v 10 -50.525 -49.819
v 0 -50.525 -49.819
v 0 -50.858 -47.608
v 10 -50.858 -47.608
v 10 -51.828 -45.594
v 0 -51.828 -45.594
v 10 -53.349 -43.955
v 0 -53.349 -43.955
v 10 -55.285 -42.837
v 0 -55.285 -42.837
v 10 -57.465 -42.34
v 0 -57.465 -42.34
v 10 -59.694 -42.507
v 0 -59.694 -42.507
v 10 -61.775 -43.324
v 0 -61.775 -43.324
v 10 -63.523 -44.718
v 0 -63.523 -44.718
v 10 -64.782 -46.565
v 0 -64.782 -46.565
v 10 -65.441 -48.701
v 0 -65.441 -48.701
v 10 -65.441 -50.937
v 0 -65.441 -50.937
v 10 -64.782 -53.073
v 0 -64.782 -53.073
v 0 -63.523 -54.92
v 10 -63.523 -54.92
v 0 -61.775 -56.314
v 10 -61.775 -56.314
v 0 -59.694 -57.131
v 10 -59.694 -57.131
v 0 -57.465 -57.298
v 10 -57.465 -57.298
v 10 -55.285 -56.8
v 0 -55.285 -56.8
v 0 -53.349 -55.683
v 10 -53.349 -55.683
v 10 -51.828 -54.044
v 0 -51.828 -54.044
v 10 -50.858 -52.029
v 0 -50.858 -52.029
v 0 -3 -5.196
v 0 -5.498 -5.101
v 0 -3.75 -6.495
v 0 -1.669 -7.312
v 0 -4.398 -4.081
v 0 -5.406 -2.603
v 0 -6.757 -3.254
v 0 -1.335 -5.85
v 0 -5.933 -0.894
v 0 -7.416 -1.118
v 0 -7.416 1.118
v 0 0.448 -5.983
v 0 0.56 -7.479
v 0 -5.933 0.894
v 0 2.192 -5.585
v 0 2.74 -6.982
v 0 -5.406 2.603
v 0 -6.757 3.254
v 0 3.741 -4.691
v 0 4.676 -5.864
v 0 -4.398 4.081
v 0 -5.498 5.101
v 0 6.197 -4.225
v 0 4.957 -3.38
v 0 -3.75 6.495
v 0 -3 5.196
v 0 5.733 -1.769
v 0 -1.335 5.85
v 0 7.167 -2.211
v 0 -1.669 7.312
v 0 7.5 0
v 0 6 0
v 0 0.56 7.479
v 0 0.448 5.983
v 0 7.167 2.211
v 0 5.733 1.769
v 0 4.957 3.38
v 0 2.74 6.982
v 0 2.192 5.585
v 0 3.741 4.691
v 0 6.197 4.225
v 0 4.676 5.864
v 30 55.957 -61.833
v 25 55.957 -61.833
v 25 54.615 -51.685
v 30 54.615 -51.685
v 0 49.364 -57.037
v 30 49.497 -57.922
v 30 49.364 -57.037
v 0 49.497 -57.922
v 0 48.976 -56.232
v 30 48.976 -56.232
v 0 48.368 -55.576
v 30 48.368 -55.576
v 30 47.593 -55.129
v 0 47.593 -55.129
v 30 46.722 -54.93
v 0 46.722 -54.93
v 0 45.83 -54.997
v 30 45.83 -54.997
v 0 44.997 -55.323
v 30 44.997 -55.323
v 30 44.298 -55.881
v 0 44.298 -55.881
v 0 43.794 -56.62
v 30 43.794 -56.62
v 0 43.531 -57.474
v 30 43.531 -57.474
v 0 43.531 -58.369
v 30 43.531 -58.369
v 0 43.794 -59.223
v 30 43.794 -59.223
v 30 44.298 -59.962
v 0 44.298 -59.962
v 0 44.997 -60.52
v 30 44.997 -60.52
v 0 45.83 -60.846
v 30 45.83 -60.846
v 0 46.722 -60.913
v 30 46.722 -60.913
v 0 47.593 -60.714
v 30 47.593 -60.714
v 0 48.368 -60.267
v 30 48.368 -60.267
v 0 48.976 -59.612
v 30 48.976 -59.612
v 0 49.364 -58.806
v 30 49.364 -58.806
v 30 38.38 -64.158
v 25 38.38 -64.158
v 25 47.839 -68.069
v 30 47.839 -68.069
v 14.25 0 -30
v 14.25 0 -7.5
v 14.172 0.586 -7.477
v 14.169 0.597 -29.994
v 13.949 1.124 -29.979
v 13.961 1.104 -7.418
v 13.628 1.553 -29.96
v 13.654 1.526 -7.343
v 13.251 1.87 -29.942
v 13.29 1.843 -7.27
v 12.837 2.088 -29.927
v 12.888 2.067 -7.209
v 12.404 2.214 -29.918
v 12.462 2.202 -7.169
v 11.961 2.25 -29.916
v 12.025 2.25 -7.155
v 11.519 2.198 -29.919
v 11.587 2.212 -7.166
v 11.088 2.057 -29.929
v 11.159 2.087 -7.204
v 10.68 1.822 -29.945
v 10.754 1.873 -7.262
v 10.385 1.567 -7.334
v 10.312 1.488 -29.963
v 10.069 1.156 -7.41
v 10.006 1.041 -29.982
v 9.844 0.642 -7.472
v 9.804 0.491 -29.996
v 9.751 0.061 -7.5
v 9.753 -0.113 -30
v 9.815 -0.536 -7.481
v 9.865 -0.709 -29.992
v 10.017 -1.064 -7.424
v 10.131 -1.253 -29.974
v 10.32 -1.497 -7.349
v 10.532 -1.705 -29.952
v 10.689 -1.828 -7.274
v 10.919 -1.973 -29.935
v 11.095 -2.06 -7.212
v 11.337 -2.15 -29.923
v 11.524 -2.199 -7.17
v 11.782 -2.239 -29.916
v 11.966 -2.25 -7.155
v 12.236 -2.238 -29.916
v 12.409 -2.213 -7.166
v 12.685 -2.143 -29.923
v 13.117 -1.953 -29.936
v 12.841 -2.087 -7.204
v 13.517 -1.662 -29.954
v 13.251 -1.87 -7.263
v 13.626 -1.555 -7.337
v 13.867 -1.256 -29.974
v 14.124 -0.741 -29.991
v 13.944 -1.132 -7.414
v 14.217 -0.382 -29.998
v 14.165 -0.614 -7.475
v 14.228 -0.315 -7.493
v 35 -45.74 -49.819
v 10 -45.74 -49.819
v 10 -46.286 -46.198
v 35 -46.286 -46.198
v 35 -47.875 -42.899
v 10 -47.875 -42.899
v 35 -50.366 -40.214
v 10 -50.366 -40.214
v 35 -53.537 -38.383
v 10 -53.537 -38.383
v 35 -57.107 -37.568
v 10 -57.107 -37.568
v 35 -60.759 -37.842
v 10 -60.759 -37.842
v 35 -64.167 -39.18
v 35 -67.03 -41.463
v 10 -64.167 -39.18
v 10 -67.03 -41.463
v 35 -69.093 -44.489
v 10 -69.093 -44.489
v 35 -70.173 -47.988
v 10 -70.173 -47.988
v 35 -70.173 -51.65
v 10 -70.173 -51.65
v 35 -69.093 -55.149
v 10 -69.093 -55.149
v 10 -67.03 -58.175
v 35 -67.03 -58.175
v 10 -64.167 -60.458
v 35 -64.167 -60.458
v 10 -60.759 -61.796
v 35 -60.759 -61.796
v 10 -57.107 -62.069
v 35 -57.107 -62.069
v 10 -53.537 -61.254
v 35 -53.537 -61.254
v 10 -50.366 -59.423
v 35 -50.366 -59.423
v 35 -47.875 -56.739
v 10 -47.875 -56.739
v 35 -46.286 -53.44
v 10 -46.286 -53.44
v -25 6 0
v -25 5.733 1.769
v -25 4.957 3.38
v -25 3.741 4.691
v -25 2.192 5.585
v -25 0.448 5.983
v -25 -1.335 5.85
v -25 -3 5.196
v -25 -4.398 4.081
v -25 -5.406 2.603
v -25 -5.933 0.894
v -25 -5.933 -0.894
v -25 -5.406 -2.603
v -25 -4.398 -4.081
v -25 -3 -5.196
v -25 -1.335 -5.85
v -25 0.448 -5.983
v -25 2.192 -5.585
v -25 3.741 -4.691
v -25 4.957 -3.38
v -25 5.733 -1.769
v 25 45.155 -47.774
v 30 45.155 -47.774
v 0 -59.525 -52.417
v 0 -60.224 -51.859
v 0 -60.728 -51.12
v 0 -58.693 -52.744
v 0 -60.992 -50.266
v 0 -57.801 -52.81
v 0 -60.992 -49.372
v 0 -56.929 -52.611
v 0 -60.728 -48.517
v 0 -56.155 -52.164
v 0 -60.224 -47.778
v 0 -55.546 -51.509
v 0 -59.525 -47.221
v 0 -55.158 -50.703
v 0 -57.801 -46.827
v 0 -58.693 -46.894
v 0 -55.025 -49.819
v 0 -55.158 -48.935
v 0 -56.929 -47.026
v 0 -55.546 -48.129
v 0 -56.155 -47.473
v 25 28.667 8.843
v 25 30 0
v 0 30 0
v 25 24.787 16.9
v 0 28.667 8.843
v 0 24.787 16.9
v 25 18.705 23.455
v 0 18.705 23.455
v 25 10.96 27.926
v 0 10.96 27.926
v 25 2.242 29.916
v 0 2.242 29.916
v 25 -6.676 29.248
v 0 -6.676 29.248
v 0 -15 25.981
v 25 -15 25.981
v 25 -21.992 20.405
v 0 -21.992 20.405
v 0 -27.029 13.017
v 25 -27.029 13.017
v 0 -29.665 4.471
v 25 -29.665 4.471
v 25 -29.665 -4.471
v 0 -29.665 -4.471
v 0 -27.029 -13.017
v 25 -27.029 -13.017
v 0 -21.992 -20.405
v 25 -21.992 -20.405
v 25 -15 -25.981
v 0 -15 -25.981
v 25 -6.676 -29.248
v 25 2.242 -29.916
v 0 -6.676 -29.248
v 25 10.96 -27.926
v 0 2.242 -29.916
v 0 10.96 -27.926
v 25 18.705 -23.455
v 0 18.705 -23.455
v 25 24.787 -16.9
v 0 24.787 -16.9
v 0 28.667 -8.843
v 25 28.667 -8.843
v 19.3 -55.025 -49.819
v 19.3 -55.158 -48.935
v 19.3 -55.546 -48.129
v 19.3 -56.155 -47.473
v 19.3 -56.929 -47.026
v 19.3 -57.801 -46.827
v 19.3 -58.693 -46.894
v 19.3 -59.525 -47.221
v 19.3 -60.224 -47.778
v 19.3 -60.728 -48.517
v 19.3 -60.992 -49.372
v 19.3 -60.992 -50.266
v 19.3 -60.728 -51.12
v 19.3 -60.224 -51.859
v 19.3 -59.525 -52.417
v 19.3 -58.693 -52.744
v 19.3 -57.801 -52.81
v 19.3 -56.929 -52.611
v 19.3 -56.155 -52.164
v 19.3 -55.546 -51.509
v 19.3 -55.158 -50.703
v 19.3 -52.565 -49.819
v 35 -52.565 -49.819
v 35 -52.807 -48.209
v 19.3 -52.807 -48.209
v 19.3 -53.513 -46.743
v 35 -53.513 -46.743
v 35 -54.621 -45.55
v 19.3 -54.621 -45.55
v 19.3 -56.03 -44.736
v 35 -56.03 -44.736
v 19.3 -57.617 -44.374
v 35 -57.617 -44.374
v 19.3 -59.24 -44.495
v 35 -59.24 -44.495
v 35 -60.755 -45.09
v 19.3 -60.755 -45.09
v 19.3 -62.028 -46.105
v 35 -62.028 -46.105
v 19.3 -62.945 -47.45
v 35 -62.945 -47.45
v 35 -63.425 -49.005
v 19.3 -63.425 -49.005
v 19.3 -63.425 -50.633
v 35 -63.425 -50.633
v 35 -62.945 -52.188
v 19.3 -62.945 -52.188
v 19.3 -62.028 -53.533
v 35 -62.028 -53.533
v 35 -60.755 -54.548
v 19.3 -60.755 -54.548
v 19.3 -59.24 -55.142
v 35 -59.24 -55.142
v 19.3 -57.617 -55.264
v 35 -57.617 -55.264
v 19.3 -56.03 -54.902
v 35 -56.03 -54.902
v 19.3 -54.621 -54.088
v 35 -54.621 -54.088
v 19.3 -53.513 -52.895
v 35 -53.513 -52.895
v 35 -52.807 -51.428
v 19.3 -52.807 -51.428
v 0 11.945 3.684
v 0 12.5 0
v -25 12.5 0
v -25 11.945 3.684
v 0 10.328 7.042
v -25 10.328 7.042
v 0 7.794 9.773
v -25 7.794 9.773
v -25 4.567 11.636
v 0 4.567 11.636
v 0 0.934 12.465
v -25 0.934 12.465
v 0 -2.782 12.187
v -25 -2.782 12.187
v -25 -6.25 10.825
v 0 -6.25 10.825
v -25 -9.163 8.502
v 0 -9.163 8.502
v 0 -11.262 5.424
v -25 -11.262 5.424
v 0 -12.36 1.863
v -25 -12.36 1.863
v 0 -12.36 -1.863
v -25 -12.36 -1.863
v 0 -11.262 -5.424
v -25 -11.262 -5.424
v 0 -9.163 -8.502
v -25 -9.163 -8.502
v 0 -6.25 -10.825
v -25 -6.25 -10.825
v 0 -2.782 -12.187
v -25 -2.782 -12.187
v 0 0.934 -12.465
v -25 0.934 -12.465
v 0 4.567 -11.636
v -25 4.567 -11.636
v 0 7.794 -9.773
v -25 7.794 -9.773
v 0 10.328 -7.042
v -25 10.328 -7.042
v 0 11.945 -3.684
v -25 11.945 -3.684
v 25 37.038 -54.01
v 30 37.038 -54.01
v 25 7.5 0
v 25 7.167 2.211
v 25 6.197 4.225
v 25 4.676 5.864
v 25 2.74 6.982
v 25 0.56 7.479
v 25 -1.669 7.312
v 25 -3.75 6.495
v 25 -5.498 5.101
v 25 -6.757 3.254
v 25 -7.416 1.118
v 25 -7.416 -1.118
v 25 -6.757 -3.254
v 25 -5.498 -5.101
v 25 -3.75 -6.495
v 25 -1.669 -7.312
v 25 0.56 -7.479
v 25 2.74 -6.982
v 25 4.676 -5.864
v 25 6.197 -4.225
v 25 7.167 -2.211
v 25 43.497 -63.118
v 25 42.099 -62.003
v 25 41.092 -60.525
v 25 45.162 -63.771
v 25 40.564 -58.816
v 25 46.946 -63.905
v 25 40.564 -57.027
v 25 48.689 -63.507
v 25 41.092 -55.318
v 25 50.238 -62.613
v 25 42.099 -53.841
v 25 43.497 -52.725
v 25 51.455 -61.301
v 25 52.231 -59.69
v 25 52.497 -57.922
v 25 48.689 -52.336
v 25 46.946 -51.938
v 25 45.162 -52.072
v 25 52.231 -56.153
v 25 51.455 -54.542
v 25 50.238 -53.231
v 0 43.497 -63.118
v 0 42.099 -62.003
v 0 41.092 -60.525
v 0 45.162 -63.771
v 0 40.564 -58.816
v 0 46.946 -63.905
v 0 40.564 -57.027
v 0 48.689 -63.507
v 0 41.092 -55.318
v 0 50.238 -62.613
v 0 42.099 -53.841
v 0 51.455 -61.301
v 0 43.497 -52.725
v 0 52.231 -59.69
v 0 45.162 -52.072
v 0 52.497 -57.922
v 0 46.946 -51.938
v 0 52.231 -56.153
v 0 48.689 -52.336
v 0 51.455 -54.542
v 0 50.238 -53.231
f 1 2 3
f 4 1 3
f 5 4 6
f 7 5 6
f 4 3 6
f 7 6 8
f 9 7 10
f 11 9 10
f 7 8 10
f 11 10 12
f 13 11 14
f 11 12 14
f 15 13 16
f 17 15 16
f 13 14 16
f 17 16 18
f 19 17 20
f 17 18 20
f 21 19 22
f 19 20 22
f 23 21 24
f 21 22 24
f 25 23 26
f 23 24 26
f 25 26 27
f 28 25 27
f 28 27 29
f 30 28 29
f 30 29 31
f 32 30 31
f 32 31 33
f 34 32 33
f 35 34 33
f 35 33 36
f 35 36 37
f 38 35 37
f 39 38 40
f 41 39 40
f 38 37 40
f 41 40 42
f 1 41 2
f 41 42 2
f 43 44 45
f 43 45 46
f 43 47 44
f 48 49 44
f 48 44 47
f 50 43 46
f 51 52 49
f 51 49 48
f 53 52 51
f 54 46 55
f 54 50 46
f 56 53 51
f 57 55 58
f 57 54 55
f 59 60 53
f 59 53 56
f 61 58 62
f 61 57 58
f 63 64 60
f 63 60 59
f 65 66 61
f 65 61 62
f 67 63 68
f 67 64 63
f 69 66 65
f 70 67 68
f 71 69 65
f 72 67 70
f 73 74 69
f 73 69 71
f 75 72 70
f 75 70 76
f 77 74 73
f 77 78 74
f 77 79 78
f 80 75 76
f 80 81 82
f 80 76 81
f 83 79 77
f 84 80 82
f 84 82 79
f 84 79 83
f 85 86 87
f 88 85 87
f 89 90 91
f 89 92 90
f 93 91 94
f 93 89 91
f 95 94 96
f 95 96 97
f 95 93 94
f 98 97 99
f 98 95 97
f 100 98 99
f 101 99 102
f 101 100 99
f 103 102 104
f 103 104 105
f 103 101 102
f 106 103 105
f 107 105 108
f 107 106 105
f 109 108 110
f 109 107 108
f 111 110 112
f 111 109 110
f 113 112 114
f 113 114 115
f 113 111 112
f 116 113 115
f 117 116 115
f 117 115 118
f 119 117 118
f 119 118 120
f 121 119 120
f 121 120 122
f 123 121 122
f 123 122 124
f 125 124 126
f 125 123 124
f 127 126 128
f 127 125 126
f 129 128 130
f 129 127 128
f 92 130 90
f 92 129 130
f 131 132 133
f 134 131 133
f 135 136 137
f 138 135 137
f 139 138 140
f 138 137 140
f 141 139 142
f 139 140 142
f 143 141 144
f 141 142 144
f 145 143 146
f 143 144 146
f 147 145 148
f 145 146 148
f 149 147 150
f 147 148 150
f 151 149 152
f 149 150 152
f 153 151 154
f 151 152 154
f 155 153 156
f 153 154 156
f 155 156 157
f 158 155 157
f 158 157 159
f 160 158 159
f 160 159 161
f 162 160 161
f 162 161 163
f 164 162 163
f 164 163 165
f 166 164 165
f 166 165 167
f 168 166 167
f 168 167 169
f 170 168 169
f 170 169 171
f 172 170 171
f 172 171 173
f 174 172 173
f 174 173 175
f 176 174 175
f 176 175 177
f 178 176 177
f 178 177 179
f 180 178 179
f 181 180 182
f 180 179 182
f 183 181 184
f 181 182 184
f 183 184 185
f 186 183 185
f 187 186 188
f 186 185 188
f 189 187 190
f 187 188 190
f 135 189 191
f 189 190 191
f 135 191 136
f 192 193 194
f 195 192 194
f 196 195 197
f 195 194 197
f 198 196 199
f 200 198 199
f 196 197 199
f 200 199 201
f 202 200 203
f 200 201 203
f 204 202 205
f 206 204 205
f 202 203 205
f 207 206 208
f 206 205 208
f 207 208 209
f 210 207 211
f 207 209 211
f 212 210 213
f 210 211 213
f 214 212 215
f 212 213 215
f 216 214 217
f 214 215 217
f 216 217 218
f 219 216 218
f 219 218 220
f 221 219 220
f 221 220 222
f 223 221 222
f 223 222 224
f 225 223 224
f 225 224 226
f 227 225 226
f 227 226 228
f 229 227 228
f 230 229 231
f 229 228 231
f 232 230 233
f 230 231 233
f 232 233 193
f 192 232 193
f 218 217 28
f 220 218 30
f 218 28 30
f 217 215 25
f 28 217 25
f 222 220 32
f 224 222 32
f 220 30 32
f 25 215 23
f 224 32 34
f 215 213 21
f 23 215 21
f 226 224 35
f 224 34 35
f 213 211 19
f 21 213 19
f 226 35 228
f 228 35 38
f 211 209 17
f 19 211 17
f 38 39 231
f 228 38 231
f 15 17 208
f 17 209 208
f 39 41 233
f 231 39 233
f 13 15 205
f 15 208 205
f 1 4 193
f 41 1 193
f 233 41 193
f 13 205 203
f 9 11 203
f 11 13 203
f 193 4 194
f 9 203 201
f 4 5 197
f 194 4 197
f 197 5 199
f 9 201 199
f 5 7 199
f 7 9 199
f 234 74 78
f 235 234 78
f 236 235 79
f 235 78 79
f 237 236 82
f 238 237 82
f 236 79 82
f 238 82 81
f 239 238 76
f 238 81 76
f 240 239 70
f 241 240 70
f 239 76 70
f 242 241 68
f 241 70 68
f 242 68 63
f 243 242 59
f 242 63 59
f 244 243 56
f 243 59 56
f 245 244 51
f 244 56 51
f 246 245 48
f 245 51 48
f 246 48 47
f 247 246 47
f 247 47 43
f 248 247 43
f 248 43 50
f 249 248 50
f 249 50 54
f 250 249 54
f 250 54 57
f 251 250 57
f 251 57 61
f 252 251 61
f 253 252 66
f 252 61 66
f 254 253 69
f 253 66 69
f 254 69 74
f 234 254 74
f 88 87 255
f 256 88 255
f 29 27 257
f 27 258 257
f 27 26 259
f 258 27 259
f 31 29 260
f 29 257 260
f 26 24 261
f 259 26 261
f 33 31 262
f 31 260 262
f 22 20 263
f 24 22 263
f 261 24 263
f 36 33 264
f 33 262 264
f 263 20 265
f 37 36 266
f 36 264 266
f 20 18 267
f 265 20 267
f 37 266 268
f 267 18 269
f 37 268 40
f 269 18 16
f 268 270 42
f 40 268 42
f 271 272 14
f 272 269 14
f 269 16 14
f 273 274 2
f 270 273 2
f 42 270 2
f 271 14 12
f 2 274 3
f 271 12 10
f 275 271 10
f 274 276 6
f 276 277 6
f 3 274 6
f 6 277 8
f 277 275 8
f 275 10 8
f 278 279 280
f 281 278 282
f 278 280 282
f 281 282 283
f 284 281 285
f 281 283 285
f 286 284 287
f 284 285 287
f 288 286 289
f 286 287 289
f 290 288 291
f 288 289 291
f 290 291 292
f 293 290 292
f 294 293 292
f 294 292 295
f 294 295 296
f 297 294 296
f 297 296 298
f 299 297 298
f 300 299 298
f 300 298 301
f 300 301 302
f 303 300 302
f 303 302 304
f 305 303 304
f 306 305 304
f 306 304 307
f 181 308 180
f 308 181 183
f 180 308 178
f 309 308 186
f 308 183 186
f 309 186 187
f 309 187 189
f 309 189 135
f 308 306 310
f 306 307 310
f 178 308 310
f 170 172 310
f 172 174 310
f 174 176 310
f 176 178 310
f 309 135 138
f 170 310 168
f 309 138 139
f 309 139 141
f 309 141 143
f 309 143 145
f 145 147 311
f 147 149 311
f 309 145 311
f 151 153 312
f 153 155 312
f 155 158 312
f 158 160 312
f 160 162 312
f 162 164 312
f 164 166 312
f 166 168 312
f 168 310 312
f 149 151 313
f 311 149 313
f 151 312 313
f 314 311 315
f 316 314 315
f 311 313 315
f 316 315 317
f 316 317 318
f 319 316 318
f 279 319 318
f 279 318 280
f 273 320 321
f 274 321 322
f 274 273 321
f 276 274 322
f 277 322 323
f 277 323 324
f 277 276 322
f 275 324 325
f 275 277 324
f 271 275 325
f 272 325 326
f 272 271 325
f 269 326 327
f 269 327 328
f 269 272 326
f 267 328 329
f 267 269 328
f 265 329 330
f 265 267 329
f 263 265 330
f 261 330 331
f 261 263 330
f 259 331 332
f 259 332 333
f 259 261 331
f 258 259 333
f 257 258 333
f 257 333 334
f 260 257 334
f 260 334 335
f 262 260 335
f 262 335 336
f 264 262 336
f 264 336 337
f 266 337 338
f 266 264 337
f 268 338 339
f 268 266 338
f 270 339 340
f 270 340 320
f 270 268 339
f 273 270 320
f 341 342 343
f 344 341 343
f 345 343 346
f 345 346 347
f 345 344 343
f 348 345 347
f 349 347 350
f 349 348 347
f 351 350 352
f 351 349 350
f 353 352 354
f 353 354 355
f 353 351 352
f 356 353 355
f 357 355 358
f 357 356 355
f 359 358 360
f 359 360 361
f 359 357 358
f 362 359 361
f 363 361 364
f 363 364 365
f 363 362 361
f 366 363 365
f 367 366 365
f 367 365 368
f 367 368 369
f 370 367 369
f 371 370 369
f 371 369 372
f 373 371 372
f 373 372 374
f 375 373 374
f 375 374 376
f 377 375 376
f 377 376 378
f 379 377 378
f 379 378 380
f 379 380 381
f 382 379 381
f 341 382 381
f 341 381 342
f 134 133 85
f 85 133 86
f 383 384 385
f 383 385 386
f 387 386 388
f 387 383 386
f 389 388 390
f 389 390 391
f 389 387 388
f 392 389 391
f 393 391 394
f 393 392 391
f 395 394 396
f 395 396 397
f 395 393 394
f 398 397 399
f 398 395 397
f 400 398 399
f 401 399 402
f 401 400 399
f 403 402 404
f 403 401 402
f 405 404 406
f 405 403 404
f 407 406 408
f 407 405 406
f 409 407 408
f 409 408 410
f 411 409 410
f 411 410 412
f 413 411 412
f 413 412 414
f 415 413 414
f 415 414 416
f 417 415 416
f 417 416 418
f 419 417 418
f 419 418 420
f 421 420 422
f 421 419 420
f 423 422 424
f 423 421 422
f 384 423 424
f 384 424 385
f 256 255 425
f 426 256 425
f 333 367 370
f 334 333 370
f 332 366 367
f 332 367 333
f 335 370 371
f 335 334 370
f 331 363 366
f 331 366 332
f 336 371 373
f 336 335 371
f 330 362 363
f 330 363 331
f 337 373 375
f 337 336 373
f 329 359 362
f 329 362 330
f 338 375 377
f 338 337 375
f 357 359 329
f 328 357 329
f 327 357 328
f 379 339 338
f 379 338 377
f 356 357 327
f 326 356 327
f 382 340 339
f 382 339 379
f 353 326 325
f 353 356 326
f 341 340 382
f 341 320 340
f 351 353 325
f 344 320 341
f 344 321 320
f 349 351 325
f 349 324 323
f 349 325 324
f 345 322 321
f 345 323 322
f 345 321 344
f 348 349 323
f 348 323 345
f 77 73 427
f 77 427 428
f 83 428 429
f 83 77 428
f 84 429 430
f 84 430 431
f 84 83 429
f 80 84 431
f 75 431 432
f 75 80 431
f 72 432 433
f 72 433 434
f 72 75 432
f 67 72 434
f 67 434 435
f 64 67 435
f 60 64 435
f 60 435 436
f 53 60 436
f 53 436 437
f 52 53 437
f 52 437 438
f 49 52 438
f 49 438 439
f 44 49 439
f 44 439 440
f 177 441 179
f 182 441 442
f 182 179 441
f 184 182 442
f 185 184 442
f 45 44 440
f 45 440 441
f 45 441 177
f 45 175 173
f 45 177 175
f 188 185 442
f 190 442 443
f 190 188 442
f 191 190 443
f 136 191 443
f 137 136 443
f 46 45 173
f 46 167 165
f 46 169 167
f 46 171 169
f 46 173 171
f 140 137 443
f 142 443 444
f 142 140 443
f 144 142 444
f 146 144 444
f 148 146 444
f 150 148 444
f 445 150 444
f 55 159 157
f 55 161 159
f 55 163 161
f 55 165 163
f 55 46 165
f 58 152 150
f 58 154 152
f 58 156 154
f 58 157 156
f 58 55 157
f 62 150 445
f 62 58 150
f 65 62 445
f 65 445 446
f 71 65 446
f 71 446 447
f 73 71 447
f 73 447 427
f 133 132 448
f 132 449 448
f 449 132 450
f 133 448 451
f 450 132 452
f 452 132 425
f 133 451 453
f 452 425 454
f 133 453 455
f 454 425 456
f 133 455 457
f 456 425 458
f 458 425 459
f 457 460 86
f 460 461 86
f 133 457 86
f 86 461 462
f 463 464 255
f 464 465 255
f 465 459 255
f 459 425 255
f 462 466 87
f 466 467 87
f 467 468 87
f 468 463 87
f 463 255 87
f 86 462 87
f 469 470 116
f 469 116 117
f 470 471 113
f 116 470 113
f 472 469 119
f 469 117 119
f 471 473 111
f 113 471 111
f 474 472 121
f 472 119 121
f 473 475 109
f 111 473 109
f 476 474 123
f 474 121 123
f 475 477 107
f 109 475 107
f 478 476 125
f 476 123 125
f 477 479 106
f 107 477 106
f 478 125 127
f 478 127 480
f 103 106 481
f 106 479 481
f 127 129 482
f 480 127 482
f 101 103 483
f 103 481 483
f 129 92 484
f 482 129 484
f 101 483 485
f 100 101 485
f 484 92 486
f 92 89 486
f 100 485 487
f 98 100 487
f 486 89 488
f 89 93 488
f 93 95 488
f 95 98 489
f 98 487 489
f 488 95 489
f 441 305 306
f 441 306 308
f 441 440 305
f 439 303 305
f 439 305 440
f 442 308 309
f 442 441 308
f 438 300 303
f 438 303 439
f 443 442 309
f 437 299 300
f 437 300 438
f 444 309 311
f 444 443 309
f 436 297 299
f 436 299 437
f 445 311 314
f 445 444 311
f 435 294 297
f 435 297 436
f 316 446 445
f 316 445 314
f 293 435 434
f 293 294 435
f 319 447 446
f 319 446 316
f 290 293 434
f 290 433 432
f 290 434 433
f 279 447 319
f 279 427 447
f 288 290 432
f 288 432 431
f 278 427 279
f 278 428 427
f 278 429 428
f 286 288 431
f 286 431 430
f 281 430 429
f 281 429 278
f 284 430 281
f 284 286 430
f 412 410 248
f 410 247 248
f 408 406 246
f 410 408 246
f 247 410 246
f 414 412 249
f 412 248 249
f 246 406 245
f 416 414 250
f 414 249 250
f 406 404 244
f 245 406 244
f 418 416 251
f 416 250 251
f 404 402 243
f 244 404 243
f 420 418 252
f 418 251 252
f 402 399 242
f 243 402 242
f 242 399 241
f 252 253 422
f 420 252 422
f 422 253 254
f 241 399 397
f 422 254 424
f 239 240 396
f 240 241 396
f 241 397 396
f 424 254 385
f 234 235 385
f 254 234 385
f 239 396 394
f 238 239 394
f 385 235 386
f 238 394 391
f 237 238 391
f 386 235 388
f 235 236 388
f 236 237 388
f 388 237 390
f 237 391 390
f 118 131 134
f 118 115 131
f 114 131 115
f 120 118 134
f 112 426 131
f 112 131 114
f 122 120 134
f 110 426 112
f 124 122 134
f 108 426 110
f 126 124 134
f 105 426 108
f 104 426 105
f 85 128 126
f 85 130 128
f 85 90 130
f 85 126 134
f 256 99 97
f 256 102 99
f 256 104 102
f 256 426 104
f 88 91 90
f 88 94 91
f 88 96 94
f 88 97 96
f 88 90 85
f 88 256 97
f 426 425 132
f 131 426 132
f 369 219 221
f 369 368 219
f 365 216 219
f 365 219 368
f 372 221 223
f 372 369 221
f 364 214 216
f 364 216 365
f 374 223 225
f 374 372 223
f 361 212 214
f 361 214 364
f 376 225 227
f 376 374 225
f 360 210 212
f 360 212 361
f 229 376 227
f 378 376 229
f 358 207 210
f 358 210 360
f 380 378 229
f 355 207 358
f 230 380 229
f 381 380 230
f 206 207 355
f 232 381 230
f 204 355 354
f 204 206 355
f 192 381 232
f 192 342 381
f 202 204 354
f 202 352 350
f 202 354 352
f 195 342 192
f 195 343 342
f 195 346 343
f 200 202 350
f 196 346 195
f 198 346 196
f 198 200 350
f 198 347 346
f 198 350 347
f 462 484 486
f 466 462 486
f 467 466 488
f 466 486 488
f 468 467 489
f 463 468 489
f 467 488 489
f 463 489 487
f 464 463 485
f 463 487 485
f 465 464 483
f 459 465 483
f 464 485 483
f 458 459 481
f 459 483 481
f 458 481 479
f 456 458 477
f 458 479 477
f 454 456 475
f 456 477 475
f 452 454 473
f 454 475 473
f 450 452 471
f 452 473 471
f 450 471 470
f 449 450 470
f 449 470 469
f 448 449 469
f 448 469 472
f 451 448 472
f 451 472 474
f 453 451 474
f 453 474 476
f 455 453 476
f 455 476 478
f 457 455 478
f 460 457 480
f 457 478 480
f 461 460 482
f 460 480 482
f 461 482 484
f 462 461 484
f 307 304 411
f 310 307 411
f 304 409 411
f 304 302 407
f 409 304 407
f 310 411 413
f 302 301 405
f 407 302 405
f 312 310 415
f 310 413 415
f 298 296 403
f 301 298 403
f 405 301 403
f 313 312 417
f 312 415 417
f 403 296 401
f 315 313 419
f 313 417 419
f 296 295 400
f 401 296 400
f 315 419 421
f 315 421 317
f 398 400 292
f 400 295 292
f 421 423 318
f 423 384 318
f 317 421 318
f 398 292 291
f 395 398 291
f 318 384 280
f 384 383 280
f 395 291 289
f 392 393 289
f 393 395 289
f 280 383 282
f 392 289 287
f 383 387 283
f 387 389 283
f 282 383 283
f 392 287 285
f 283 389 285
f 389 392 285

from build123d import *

# Parameters (mm, degrees)
F0_R      = 12.5
F0_R_2    = 6
F1_DEPTH  = 25
F2_R      = 30
F2_R_2    = 7.5
F3_DEPTH  = 25
F4_R      = 2.25
F5_DEPTH  = 36.7
F6_R      = 7.5
F6_R_2    = 3
F7_DEPTH  = 10
F8_R      = 12.2847556344
F8_R_2    = 5.4605261275
F9_DEPTH  = 25
F10_R     = 6
F10_R_2   = 3
F11_DEPTH = 25
F12_DEPTH = 9.3
F13_R     = 6
F14_DEPTH = 9.4
F16_R     = 6
F16_R_2   = 3
F17_DEPTH = 5


with BuildPart() as f1:
    # F0 (on Right) → F1 (new body)
    with BuildSketch(Plane.YZ):
        Circle(F0_R)
        Circle(F0_R_2, mode=Mode.SUBTRACT)
    extrude(amount=-F1_DEPTH)

    # F2 (on face) → F3 (join)
    with BuildSketch(Plane.YZ):
        Circle(F2_R)
        Circle(F2_R_2, mode=Mode.SUBTRACT)
    extrude(amount=F3_DEPTH)

    # F4 (on Top) → F5 (cut)
    with BuildSketch(Plane.XY):
        with Locations((12, 0)):
            Circle(F4_R)
    extrude(amount=-F5_DEPTH, mode=Mode.SUBTRACT)


with BuildPart() as f7:
    # F6 (on Right) → F7 (new body)
    with BuildSketch(Plane.YZ):
        with Locations((-58.0251142383, -49.8188361526)):
            Circle(F6_R)
        with Locations((-58.0251142383, -49.8188361526)):
            Circle(F6_R_2, mode=Mode.SUBTRACT)
    extrude(amount=F7_DEPTH)

    # F8 (on face) → F9 (join)
    with BuildSketch(Plane.YZ.offset(10)):
        with Locations((-58.0251142383, -49.8188361526)):
            Circle(F8_R)
        with Locations((-58.0251142383, -49.8188361526)):
            Circle(F8_R_2, mode=Mode.SUBTRACT)
    extrude(amount=F9_DEPTH)

    # F12 (add): a face of the model
    f12_faces = [f7.faces().sort_by_distance(p)[0] for p in [
        (10, -63.3311933636, -49.8188361526),
    ]]
    extrude(f12_faces, amount=F12_DEPTH)


with BuildPart() as f11:
    # F10 (on Right) → F11 (new body)
    with BuildSketch(Plane.YZ):
        with Locations((46.4974045753, -57.921551168)):
            Circle(F10_R)
        with Locations((46.4974045753, -57.921551168)):
            Circle(F10_R_2, mode=Mode.SUBTRACT)
    extrude(amount=F11_DEPTH)

    # F16 (on face) → F17 (join)
    with BuildSketch(Plane.YZ.offset(25)):
        Polygon((47.8394083717, -68.0694858352), (55.9567756913, -61.833309122), (54.6147718949, -51.6853744548), (45.155400779, -47.7736165007), (37.0380334594, -54.009793214), (38.3800372558, -64.1577278812), align=None)
        with Locations((46.4974045753, -57.921551168)):
            Circle(F16_R, mode=Mode.SUBTRACT)
        with Locations((46.4974045753, -57.921551168)):
            Circle(F16_R)
        with Locations((46.4974045753, -57.921551168)):
            Circle(F16_R_2, mode=Mode.SUBTRACT)
    extrude(amount=F17_DEPTH)


with BuildPart() as f14:
    # F13 (on face) → F14 (new body)
    with BuildSketch(Plane.YZ.offset(25)):
        Polygon((31.8439276661, -58.8649387834), (39.9876637613, -71.0835282329), (54.6411406705, -70.1401406175), (61.1508814846, -56.9781635526), (53.0071453894, -44.7595741031), (38.3536684802, -45.7029617185), align=None)
        with Locations((46.4974045753, -57.921551168)):
            Circle(F13_R, mode=Mode.SUBTRACT)
    extrude(amount=F14_DEPTH)


solid = Compound([f1.part, f7.part, f11.part])
